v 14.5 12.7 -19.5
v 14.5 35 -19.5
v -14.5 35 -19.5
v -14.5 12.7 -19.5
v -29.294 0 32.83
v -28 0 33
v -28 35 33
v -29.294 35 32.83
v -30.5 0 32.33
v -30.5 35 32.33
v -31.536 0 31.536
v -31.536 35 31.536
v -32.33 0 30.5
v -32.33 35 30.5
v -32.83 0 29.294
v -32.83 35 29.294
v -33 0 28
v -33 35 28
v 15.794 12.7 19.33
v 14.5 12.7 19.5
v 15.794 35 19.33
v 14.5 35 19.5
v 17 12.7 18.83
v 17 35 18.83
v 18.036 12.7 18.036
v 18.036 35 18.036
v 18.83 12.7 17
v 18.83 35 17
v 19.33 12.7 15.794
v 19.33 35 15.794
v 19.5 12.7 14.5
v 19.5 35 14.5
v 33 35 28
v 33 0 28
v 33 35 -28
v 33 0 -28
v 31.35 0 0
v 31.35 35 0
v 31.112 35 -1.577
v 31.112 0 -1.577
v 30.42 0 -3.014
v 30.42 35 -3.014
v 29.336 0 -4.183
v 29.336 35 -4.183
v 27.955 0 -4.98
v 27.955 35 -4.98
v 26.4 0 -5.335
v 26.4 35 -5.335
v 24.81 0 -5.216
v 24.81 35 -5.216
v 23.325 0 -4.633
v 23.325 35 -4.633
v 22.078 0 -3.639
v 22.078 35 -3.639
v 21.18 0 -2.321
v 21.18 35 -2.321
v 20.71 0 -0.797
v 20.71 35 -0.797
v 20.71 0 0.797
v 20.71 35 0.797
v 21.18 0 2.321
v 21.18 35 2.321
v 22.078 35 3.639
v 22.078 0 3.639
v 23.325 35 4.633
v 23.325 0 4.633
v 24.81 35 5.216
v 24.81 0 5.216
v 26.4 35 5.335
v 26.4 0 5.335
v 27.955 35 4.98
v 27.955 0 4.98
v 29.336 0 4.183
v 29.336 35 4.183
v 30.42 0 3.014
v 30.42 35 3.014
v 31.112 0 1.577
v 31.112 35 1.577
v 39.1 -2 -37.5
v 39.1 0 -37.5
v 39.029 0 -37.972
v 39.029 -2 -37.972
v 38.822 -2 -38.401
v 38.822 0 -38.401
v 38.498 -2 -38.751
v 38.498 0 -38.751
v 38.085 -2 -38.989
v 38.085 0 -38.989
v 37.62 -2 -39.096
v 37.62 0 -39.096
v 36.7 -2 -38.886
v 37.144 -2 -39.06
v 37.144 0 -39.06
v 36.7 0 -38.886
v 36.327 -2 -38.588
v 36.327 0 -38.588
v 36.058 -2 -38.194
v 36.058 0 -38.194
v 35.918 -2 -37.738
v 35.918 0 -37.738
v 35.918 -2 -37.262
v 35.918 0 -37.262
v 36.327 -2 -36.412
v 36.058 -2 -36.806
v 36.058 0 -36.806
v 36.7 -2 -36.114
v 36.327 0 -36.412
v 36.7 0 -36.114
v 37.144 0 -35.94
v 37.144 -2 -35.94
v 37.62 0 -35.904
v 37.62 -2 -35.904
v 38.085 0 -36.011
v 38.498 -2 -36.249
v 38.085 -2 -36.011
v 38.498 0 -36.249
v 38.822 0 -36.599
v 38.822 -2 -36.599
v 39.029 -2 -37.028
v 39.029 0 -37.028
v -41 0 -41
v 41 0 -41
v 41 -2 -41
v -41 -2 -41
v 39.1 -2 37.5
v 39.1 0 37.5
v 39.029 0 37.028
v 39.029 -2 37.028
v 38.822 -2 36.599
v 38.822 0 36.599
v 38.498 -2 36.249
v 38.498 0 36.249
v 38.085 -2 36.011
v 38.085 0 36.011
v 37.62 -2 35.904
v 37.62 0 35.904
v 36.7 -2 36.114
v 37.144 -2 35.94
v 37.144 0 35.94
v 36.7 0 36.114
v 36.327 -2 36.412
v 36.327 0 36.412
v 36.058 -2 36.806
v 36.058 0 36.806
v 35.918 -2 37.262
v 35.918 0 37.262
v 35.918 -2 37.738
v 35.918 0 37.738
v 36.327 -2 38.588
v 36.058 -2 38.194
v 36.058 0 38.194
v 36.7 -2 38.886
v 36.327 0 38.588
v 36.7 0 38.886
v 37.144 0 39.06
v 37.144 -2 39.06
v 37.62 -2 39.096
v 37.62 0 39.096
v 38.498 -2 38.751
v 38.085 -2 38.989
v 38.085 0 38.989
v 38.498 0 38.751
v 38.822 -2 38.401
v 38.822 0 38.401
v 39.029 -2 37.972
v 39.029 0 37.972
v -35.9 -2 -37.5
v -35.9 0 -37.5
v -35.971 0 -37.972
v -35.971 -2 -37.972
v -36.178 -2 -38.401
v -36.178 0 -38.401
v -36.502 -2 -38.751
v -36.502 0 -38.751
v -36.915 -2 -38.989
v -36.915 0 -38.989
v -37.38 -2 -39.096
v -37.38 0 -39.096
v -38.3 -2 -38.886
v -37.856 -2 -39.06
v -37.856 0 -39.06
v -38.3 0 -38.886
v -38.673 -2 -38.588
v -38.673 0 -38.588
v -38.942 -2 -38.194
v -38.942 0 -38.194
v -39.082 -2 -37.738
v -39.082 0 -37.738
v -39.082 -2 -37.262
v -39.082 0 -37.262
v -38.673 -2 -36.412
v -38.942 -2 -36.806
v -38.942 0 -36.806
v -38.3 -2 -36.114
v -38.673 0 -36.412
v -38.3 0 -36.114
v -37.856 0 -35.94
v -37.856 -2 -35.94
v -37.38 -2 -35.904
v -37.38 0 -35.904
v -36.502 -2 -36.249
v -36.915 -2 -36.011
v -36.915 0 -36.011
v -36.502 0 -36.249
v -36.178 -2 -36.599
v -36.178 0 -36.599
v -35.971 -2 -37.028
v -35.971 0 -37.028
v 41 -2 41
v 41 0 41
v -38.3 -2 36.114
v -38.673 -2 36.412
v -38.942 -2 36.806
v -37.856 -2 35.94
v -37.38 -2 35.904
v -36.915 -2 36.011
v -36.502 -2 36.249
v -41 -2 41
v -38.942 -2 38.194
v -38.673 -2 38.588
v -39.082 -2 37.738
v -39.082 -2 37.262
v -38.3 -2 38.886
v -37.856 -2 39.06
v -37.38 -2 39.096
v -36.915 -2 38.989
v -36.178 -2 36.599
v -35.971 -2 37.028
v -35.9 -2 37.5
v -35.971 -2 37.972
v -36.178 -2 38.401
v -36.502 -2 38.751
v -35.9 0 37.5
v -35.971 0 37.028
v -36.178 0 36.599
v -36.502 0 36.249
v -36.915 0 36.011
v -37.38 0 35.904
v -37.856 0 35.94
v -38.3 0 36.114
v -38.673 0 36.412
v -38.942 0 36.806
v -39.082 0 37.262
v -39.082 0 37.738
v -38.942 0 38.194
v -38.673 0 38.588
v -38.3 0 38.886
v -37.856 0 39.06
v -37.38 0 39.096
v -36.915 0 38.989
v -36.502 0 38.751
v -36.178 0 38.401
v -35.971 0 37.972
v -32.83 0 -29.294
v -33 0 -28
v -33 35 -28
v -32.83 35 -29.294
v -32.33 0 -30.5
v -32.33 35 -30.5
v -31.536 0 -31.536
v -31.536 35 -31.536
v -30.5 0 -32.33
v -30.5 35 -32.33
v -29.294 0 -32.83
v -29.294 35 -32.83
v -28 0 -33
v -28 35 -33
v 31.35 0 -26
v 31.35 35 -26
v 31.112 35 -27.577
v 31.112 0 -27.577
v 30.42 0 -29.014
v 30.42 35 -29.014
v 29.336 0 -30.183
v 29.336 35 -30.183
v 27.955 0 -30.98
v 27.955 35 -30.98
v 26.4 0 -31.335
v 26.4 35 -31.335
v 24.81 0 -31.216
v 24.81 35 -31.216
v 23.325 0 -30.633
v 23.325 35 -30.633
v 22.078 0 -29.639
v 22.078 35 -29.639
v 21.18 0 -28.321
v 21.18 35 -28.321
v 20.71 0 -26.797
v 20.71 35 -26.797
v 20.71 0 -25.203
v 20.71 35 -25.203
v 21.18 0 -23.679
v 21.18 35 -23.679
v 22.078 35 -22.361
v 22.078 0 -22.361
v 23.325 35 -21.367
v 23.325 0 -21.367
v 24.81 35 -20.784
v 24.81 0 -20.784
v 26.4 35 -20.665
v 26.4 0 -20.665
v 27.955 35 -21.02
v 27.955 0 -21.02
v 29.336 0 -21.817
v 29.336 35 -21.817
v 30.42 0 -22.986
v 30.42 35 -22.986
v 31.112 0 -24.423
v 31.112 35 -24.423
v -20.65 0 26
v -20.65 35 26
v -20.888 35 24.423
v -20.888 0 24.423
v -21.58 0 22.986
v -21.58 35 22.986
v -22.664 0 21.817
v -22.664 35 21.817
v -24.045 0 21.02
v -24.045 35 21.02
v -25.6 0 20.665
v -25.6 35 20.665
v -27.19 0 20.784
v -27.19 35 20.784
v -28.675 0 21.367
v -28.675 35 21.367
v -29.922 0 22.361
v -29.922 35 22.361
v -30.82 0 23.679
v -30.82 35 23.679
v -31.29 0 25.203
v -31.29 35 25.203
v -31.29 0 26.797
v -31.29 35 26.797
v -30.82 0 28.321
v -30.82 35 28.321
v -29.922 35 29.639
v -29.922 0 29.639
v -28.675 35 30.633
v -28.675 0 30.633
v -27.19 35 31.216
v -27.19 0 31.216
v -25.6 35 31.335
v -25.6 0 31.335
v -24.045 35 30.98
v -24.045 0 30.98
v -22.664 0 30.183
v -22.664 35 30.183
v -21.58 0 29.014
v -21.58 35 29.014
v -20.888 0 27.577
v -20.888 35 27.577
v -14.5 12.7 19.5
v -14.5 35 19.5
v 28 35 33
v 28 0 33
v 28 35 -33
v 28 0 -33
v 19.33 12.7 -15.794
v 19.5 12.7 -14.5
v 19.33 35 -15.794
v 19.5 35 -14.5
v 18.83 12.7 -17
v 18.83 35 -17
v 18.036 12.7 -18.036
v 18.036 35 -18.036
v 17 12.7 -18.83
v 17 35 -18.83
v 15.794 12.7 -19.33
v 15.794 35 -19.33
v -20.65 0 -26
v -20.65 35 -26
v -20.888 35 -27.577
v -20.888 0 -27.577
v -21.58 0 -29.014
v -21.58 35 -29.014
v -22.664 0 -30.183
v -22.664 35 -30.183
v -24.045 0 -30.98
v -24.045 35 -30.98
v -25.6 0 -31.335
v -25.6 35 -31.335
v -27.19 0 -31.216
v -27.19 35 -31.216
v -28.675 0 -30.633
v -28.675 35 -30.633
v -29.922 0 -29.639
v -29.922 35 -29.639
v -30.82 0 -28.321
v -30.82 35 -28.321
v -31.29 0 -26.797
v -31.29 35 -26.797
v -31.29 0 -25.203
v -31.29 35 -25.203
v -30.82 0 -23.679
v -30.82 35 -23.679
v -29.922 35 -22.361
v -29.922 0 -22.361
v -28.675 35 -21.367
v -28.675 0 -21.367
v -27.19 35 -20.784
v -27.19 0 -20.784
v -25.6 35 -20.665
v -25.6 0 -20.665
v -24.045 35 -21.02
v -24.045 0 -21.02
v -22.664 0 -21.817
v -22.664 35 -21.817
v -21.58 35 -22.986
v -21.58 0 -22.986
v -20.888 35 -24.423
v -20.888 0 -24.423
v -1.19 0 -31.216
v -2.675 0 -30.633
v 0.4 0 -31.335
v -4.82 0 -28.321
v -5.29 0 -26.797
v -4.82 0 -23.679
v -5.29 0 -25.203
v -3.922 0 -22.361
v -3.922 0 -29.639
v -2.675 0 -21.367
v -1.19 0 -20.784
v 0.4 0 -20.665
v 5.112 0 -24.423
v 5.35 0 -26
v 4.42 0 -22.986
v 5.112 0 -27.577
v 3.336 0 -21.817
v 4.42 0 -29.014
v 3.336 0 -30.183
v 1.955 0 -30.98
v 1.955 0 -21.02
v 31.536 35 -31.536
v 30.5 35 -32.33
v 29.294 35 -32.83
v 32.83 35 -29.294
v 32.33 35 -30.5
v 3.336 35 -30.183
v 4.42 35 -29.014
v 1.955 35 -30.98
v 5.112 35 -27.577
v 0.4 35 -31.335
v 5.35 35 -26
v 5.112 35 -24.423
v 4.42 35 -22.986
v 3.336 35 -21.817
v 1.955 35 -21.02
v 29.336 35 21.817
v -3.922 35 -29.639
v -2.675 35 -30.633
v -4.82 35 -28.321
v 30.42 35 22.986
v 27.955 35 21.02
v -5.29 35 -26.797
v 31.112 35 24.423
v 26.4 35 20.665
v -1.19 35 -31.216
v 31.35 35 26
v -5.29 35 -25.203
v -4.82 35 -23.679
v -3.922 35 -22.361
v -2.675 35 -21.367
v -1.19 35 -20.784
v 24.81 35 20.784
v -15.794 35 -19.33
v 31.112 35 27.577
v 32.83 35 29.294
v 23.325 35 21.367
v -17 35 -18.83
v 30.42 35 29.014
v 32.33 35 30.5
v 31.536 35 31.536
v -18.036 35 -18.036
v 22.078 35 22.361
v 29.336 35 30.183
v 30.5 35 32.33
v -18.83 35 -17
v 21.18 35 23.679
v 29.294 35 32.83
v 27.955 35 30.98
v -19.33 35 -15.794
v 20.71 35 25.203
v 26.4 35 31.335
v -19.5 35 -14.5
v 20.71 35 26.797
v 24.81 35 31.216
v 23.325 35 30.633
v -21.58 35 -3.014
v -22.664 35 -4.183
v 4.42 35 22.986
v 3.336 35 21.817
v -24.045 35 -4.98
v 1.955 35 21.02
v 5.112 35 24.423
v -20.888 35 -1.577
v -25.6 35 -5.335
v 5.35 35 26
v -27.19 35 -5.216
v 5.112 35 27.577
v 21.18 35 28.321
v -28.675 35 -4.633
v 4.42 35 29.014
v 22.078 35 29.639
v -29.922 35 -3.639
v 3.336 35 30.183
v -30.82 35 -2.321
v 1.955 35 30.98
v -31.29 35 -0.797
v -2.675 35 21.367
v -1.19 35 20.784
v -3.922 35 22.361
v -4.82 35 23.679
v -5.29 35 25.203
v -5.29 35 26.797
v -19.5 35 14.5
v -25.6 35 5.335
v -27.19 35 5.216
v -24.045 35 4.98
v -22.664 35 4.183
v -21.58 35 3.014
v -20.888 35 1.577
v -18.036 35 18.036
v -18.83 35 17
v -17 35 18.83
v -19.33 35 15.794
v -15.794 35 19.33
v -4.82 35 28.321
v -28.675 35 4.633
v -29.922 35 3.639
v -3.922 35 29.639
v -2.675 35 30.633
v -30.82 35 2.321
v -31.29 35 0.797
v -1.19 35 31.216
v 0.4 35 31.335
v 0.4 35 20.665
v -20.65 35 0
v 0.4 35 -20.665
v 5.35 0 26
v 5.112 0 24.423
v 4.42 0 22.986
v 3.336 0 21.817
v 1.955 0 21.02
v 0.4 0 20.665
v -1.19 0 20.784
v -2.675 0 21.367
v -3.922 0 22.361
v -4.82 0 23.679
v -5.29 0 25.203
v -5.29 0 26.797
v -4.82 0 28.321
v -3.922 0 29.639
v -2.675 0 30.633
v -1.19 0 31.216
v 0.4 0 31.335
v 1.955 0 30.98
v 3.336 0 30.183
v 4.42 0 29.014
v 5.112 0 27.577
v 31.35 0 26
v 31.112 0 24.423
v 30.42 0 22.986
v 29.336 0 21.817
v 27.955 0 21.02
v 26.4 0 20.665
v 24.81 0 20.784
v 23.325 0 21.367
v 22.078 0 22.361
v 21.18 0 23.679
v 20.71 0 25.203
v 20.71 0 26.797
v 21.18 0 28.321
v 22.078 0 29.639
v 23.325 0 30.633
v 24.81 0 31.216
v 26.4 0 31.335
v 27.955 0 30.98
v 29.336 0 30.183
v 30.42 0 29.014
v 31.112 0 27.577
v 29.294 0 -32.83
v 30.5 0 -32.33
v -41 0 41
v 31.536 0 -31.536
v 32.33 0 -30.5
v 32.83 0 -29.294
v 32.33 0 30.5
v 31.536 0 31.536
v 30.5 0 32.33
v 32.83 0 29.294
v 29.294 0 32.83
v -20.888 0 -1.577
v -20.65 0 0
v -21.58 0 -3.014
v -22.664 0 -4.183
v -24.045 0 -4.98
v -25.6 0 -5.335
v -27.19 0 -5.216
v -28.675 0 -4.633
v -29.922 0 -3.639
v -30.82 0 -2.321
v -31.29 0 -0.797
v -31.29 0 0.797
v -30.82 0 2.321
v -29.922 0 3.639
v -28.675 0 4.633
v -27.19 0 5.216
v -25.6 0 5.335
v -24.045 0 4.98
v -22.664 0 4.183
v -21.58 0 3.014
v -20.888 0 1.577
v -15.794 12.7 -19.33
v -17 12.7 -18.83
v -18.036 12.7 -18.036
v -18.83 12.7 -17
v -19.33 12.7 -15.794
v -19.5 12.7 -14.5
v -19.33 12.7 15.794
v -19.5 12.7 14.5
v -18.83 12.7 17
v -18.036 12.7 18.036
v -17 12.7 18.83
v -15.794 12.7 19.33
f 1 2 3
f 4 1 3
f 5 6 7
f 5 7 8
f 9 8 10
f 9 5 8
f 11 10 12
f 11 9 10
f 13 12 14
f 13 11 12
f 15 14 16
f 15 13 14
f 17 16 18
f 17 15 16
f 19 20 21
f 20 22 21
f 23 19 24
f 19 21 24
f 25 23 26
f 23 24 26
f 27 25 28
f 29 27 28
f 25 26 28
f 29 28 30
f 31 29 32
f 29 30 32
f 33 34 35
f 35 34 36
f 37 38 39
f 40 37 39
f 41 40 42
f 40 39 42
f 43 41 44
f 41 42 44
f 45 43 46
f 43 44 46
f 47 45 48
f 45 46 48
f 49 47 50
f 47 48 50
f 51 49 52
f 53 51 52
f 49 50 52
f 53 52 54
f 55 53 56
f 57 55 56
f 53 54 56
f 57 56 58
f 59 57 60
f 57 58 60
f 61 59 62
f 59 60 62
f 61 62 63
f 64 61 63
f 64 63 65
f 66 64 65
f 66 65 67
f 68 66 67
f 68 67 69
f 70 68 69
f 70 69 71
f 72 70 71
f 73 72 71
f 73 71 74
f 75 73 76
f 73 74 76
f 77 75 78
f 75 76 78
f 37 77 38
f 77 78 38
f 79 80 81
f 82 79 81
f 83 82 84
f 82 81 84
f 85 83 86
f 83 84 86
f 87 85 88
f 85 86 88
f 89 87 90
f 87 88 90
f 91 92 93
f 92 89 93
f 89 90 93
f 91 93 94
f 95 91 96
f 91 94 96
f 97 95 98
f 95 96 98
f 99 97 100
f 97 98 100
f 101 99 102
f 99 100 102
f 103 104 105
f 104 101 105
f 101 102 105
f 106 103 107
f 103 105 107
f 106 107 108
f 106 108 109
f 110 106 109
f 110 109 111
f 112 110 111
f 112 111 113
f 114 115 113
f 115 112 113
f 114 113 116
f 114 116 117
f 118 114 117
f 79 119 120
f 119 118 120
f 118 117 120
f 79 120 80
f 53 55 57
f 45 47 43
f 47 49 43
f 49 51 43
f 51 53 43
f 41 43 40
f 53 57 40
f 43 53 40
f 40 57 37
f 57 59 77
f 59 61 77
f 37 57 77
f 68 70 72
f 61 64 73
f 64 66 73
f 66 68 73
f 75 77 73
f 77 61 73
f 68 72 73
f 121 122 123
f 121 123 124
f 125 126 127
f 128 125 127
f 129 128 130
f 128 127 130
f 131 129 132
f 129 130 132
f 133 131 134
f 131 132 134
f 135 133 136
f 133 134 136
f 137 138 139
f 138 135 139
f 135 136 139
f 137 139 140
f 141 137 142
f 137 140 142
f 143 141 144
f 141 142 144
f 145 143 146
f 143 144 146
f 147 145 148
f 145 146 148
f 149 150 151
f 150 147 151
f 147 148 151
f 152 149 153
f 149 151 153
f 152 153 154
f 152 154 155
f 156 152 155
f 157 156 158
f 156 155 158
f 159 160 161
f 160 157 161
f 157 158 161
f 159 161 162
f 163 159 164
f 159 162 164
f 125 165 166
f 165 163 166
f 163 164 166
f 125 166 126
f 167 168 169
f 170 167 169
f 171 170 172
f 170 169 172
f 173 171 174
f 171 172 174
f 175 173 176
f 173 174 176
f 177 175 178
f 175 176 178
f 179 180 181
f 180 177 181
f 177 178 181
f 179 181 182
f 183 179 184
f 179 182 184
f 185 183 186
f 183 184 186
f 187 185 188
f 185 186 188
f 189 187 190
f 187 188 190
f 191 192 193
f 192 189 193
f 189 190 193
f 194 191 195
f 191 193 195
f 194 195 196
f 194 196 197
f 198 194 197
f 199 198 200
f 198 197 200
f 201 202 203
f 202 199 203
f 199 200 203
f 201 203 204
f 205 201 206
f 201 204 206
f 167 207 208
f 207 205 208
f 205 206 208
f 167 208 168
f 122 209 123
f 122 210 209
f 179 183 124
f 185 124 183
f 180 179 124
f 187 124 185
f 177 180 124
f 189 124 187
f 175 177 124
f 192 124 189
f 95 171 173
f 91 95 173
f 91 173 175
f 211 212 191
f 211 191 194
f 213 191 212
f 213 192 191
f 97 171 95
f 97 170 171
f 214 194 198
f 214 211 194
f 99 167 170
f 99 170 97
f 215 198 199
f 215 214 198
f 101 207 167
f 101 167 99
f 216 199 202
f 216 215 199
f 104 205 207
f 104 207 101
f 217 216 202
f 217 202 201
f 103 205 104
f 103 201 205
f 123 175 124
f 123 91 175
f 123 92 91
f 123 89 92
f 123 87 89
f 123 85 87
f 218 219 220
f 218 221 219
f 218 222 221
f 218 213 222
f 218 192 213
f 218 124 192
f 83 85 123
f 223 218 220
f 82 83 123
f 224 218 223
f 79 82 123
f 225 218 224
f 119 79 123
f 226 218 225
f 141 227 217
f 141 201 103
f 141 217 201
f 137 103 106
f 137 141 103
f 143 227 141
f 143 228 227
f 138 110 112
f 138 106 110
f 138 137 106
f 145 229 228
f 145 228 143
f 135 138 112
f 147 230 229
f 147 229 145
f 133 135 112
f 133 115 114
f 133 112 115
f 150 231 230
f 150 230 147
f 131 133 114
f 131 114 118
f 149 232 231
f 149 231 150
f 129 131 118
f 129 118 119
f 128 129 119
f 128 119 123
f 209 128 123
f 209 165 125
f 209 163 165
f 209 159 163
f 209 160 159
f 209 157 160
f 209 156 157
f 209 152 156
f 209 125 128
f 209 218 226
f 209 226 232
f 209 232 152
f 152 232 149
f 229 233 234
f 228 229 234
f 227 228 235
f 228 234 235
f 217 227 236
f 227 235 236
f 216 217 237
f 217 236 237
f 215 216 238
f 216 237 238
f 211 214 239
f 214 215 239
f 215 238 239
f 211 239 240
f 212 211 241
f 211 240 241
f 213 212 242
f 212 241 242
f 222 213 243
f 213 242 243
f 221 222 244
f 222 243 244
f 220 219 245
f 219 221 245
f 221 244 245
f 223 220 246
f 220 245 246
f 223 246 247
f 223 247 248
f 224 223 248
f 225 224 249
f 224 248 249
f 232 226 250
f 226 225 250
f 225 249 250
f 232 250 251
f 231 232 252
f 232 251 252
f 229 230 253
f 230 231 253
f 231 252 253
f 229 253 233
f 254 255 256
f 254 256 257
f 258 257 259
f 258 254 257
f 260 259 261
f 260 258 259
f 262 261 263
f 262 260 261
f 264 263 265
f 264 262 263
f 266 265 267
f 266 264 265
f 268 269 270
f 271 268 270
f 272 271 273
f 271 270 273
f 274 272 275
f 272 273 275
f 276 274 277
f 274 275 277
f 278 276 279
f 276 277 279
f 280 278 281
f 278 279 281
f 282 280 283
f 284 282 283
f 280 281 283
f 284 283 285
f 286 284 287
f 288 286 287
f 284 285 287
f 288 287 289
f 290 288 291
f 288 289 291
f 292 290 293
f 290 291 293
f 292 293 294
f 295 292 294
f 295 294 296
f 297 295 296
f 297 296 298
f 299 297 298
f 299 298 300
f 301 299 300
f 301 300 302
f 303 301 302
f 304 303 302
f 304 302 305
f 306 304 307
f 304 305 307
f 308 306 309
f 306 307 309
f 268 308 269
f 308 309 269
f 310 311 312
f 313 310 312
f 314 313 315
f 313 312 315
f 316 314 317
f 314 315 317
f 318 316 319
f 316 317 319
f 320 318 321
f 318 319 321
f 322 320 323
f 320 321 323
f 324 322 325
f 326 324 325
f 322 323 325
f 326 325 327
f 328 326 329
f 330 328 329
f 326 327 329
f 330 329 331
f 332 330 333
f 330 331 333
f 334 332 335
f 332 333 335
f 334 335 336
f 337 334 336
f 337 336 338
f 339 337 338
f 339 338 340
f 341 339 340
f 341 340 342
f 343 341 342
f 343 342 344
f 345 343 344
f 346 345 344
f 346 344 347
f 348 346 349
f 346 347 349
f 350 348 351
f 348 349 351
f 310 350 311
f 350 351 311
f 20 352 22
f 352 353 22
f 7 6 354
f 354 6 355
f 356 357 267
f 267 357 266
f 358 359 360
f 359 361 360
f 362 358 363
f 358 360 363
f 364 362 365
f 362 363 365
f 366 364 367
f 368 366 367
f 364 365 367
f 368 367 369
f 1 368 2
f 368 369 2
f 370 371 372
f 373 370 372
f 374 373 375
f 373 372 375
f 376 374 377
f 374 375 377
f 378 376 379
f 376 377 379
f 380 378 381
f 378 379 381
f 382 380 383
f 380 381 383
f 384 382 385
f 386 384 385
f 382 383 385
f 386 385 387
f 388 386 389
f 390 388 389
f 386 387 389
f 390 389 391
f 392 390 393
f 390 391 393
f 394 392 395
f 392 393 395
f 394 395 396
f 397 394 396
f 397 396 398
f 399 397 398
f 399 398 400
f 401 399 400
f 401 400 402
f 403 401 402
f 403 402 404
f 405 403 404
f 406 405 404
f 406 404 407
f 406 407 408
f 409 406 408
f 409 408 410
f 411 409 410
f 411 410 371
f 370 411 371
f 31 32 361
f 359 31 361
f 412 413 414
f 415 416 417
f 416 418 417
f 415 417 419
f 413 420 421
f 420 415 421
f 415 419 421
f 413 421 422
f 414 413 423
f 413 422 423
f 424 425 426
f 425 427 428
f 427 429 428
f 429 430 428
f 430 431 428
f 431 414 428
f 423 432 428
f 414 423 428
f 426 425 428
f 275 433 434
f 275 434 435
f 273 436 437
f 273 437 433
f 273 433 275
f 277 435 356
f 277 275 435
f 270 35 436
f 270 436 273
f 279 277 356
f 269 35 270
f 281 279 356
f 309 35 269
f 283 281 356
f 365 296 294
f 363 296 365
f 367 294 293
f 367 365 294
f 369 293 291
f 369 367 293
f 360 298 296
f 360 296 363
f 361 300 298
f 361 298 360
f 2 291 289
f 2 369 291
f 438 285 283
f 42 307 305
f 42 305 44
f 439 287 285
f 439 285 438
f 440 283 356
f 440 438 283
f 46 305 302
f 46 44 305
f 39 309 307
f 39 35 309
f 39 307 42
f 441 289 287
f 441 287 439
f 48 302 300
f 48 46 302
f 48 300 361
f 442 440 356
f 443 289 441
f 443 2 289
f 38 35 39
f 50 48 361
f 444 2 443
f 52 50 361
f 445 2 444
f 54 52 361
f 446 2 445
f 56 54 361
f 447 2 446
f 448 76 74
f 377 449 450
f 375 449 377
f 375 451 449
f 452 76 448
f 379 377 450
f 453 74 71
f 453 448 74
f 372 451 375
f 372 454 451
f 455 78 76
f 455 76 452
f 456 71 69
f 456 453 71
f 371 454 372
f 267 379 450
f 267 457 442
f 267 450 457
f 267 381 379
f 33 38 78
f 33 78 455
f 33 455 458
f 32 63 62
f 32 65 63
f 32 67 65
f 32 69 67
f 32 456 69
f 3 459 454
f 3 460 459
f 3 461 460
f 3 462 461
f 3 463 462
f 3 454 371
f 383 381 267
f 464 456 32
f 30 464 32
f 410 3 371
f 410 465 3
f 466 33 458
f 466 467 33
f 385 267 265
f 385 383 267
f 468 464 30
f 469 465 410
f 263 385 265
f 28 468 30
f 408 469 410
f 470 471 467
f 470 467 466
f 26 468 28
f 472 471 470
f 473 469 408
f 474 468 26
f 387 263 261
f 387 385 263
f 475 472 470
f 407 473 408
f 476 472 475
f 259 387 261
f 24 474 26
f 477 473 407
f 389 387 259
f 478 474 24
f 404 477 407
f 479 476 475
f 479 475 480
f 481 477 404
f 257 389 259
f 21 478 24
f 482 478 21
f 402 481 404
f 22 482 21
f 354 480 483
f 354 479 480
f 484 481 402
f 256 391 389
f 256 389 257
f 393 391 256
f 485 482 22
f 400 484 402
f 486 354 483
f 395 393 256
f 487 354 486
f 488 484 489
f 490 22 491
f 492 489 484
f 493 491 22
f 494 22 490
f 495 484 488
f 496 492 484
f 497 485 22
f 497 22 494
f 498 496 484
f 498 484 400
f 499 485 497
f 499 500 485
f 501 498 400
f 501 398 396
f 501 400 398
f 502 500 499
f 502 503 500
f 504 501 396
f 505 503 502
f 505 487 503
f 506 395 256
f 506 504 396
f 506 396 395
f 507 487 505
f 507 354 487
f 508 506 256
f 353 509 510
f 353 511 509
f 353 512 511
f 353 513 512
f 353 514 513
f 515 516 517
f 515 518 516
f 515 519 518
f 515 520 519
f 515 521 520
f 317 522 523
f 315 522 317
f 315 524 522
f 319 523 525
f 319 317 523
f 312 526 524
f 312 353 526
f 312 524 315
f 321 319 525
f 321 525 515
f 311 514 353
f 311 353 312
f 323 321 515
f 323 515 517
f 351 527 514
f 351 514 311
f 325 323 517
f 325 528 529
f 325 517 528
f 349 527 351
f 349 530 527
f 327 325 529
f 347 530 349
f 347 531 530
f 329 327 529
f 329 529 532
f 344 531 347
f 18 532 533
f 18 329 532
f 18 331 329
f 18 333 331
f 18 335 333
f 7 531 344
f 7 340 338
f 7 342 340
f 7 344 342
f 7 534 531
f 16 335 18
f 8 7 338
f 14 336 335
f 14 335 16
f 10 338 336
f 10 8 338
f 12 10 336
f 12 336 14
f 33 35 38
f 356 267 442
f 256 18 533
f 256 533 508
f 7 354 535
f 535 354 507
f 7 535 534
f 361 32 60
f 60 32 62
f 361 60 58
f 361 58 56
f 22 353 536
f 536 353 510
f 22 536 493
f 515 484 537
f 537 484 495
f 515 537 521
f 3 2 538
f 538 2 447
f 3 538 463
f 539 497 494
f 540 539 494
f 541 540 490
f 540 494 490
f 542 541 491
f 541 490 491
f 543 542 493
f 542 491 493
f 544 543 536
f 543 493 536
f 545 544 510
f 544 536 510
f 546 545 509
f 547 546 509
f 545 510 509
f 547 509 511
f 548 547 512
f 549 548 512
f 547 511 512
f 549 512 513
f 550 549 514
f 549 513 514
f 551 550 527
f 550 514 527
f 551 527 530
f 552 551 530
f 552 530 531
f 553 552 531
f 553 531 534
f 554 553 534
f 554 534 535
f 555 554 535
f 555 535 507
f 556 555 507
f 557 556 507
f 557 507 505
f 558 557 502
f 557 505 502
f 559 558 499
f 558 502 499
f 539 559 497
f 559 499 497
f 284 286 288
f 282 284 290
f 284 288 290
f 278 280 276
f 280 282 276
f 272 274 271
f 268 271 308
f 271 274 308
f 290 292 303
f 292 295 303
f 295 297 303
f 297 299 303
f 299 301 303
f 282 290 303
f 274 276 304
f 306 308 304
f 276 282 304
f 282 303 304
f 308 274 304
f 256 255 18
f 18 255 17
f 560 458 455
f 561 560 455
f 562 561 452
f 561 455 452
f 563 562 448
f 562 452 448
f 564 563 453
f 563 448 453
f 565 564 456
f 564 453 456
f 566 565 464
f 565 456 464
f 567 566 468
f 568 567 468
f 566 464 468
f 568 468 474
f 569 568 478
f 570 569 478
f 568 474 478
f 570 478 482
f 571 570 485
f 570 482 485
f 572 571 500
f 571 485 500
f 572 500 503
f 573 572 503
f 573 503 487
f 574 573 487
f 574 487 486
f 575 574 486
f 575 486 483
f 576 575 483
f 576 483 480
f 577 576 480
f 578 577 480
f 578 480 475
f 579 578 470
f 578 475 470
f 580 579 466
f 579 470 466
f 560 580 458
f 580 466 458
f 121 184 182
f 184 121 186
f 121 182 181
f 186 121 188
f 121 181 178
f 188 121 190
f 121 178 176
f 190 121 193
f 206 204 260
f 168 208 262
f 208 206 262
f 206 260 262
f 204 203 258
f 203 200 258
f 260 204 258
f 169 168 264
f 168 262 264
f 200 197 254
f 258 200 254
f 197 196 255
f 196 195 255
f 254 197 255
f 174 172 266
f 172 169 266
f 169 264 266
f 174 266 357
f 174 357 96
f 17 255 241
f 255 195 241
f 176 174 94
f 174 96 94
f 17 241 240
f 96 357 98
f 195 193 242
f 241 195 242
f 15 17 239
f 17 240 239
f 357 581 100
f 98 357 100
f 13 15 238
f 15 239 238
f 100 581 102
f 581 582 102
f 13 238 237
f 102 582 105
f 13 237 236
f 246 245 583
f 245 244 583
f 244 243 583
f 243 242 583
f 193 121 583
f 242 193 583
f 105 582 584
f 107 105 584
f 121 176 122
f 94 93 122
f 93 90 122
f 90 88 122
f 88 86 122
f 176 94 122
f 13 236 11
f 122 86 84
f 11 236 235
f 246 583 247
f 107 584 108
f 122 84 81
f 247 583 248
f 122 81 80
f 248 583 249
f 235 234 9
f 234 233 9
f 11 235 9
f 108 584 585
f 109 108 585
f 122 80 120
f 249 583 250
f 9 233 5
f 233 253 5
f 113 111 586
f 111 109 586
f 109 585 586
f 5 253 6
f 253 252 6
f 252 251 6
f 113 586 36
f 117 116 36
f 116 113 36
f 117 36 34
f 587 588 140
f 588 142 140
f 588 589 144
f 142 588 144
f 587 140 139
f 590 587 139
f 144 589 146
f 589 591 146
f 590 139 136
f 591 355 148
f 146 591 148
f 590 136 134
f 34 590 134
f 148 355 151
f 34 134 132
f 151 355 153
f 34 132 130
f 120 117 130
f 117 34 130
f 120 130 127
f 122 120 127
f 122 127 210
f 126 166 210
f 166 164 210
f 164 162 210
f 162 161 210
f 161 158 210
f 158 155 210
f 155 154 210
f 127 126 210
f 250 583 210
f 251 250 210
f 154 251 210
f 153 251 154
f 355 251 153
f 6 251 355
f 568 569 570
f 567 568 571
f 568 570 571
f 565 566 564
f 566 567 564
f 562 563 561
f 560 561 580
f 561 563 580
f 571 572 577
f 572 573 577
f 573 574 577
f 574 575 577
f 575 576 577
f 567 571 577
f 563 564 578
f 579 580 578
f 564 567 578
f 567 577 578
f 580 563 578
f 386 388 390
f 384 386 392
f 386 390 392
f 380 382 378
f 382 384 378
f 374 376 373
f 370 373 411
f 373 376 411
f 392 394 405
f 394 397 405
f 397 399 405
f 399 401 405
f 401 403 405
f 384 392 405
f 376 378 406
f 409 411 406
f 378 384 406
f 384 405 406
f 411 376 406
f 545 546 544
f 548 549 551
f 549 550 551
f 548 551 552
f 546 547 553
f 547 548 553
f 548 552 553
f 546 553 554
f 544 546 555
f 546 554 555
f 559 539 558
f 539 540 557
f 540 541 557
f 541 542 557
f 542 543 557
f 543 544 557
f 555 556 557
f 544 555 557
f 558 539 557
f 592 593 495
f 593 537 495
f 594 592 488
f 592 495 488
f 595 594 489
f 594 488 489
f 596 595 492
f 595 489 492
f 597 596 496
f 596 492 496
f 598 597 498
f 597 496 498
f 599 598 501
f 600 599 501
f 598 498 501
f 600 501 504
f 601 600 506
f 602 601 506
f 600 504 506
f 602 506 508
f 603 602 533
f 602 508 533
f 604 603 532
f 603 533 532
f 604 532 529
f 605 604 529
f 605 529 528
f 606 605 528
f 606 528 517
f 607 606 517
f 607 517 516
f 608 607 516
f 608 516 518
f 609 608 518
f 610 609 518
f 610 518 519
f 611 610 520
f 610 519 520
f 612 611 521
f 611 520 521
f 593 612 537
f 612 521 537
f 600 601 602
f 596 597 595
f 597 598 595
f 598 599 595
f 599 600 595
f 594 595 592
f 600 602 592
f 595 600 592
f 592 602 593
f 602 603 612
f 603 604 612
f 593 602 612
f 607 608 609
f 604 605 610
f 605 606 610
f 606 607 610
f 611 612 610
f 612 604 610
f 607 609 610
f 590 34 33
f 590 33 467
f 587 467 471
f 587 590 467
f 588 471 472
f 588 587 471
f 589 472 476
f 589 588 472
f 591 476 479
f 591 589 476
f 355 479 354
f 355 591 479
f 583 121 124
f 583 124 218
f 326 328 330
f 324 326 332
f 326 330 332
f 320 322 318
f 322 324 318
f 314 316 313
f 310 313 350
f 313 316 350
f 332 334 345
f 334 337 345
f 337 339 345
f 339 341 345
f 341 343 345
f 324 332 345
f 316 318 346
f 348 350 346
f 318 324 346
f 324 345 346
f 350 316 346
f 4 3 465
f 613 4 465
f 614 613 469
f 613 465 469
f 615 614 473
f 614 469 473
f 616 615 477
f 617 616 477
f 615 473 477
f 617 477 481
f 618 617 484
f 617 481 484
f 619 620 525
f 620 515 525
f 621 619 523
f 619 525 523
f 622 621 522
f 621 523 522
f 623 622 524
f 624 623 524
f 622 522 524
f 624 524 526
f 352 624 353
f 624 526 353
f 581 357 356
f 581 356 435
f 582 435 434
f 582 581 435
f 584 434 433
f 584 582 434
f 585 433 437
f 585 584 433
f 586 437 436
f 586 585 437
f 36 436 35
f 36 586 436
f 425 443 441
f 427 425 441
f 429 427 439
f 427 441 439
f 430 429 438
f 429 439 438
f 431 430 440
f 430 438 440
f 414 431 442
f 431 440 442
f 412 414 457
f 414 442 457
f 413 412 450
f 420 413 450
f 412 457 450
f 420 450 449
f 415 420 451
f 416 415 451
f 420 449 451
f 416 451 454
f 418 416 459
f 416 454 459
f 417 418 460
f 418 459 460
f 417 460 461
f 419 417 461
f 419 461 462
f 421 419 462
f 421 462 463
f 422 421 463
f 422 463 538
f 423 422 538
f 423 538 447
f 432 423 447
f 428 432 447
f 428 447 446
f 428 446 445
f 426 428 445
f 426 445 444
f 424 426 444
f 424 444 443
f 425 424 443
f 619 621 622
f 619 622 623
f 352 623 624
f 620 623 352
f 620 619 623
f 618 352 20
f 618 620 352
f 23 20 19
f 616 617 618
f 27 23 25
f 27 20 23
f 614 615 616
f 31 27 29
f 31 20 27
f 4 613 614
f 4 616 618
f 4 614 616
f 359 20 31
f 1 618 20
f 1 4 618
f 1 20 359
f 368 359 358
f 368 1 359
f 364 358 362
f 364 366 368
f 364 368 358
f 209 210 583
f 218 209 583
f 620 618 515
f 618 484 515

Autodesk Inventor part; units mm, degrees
ref_plane "YZ Plane" through (0, 0, 0) normal (1, 0, 0) x (0, 1, 0)
ref_plane "XZ Plane" through (0, 0, 0) normal (0, 1, 0) x (-1, 0, 0)
ref_plane "XY Plane" through (0, 0, 0) normal (0, 0, 1) x (1, 0, 0)
sketch "Sketch1" plane through (0, 0, 0) normal (0, 1, 0) x (-1, 0, 0)
  line L0 (28, 33) -> (-28, 33)
  line L1 (-33, 28) -> (-33, -28)
  line L2 (-28, -33) -> (28, -33)
  line L3 (33, -28) -> (33, 28)
  line L4 (33, 33) -> (-33, -33) construction
  line L5 (-33, 33) -> (33, -33) construction
  arc A0 (28, -33) -> (33, -28) centre (28, -28) ccw
  arc A1 (33, 28) -> (28, 33) centre (28, 28) ccw
  arc A2 (-28, 33) -> (-33, 28) centre (-28, 28) ccw
  arc A3 (-33, -28) -> (-28, -33) centre (-28, -28) ccw
  point P0 (0, 0)
  dimension "d0" = 66
  dimension "d1" = 66
  dimension "d4" = 5
extrude "Extrusion1" add sketch "Sketch1" along normal blind 35
sketch "Sketch2" plane through (0, 35, 0) normal (0, 1, 0) x (1, 0, 0)
  line L0 (0, 0) -> (-10, 0)
  line L1 (0, 0) -> (0, -10)
  circle A0 centre (26, 26) radius 5.35
  circle A1 centre (0, 26) radius 5.35
  circle A2 centre (-26, 26) radius 5.35
  circle A3 centre (26, 0) radius 5.35
  circle A4 centre (0, 0) radius 5.35
  circle A5 centre (-26, 0) radius 5.35
  circle A6 centre (26, -26) radius 5.35
  circle A7 centre (0, -26) radius 5.35
  circle A8 centre (-26, -26) radius 5.35
  dimension "d8" = 10
  dimension "d9" = 10
  dimension "d10" = 10.7
  dimension "d11" = 26
  dimension "d12" = 26
  dimension "d15" = 26
  dimension "d18" = 26
extrude "Extrusion2" cut sketch "Sketch2" against normal blind 35 contours A0 | A1 | A2 | A3 | A5 | A6 | A7 | A8
sketch "Sketch3" plane through (0, 35, 0) normal (0, 1, 0) x (1, 0, 0)
  line L0 (-14.5, -19.5) -> (14.5, -19.5)
  line L1 (19.5, -14.5) -> (19.5, 14.5)
  line L2 (14.5, 19.5) -> (-14.5, 19.5)
  line L3 (-19.5, 14.5) -> (-19.5, -14.5)
  line L4 (-19.5, -19.5) -> (19.5, 19.5) construction
  line L5 (19.5, -19.5) -> (-19.5, 19.5) construction
  arc A0 (-14.5, 19.5) -> (-19.5, 14.5) centre (-14.5, 14.5) ccw
  arc A1 (-19.5, -14.5) -> (-14.5, -19.5) centre (-14.5, -14.5) ccw
  arc A2 (14.5, -19.5) -> (19.5, -14.5) centre (14.5, -14.5) ccw
  arc A3 (19.5, 14.5) -> (14.5, 19.5) centre (14.5, 14.5) ccw
  point P0 (0, 0)
  dimension "d23" = 39
  dimension "d24" = 39
  dimension "d25" = 5
extrude "Extrusion3" cut sketch "Sketch3" against normal blind 22.3
sketch "Sketch4" plane through (0, 0, 0) normal (0, -1, 0) x (1, 0, 0)
  line L0 (37.5, 37.5) -> (-37.5, -37.5) construction
  line L1 (-37.5, 37.5) -> (37.5, -37.5) construction
  line L2 (-41, -38) -> (-41, 38)
  line L3 (41, -41) -> (-41, 41) construction
  line L4 (-41, -41) -> (41, 41) construction
  circle A0 centre (-37.5, 37.5) radius 1.6
  line L5 (38, 41) -> (-38, 41)
  line L6 (-38, -41) -> (38, -41)
  line L7 (41, -38) -> (41, 38)
  line L8 (41, 41) -> (-41, -41) construction
  line L9 (-41, 41) -> (41, -41) construction
  circle A1 centre (-37.5, -37.5) radius 1.6
  circle A2 centre (37.5, 37.5) radius 1.6
  circle A3 centre (37.5, -37.5) radius 1.6
  line L10 (-41, -38) -> (-41, -41)
  line L11 (-38, -41) -> (-41, -41)
  line L12 (-41, 38) -> (-41, 41)
  line L13 (-38, 41) -> (-41, 41)
  line L14 (38, 41) -> (41, 41)
  line L15 (41, 38) -> (41, 41)
  line L16 (41, -38) -> (41, -41)
  line L17 (41, -41) -> (38, -41)
  point P0 (0, 0)
  dimension "d28" = 75
  dimension "d29" = 75
  dimension "d31" = 82
  dimension "d56" = 3.2
  dimension "d68" = 75
  dimension "d71" = 75
extrude "Extrusion4" add sketch "Sketch4" along normal blind 2
properties part number "Aluminium Container" material "Aluminum 6061"
